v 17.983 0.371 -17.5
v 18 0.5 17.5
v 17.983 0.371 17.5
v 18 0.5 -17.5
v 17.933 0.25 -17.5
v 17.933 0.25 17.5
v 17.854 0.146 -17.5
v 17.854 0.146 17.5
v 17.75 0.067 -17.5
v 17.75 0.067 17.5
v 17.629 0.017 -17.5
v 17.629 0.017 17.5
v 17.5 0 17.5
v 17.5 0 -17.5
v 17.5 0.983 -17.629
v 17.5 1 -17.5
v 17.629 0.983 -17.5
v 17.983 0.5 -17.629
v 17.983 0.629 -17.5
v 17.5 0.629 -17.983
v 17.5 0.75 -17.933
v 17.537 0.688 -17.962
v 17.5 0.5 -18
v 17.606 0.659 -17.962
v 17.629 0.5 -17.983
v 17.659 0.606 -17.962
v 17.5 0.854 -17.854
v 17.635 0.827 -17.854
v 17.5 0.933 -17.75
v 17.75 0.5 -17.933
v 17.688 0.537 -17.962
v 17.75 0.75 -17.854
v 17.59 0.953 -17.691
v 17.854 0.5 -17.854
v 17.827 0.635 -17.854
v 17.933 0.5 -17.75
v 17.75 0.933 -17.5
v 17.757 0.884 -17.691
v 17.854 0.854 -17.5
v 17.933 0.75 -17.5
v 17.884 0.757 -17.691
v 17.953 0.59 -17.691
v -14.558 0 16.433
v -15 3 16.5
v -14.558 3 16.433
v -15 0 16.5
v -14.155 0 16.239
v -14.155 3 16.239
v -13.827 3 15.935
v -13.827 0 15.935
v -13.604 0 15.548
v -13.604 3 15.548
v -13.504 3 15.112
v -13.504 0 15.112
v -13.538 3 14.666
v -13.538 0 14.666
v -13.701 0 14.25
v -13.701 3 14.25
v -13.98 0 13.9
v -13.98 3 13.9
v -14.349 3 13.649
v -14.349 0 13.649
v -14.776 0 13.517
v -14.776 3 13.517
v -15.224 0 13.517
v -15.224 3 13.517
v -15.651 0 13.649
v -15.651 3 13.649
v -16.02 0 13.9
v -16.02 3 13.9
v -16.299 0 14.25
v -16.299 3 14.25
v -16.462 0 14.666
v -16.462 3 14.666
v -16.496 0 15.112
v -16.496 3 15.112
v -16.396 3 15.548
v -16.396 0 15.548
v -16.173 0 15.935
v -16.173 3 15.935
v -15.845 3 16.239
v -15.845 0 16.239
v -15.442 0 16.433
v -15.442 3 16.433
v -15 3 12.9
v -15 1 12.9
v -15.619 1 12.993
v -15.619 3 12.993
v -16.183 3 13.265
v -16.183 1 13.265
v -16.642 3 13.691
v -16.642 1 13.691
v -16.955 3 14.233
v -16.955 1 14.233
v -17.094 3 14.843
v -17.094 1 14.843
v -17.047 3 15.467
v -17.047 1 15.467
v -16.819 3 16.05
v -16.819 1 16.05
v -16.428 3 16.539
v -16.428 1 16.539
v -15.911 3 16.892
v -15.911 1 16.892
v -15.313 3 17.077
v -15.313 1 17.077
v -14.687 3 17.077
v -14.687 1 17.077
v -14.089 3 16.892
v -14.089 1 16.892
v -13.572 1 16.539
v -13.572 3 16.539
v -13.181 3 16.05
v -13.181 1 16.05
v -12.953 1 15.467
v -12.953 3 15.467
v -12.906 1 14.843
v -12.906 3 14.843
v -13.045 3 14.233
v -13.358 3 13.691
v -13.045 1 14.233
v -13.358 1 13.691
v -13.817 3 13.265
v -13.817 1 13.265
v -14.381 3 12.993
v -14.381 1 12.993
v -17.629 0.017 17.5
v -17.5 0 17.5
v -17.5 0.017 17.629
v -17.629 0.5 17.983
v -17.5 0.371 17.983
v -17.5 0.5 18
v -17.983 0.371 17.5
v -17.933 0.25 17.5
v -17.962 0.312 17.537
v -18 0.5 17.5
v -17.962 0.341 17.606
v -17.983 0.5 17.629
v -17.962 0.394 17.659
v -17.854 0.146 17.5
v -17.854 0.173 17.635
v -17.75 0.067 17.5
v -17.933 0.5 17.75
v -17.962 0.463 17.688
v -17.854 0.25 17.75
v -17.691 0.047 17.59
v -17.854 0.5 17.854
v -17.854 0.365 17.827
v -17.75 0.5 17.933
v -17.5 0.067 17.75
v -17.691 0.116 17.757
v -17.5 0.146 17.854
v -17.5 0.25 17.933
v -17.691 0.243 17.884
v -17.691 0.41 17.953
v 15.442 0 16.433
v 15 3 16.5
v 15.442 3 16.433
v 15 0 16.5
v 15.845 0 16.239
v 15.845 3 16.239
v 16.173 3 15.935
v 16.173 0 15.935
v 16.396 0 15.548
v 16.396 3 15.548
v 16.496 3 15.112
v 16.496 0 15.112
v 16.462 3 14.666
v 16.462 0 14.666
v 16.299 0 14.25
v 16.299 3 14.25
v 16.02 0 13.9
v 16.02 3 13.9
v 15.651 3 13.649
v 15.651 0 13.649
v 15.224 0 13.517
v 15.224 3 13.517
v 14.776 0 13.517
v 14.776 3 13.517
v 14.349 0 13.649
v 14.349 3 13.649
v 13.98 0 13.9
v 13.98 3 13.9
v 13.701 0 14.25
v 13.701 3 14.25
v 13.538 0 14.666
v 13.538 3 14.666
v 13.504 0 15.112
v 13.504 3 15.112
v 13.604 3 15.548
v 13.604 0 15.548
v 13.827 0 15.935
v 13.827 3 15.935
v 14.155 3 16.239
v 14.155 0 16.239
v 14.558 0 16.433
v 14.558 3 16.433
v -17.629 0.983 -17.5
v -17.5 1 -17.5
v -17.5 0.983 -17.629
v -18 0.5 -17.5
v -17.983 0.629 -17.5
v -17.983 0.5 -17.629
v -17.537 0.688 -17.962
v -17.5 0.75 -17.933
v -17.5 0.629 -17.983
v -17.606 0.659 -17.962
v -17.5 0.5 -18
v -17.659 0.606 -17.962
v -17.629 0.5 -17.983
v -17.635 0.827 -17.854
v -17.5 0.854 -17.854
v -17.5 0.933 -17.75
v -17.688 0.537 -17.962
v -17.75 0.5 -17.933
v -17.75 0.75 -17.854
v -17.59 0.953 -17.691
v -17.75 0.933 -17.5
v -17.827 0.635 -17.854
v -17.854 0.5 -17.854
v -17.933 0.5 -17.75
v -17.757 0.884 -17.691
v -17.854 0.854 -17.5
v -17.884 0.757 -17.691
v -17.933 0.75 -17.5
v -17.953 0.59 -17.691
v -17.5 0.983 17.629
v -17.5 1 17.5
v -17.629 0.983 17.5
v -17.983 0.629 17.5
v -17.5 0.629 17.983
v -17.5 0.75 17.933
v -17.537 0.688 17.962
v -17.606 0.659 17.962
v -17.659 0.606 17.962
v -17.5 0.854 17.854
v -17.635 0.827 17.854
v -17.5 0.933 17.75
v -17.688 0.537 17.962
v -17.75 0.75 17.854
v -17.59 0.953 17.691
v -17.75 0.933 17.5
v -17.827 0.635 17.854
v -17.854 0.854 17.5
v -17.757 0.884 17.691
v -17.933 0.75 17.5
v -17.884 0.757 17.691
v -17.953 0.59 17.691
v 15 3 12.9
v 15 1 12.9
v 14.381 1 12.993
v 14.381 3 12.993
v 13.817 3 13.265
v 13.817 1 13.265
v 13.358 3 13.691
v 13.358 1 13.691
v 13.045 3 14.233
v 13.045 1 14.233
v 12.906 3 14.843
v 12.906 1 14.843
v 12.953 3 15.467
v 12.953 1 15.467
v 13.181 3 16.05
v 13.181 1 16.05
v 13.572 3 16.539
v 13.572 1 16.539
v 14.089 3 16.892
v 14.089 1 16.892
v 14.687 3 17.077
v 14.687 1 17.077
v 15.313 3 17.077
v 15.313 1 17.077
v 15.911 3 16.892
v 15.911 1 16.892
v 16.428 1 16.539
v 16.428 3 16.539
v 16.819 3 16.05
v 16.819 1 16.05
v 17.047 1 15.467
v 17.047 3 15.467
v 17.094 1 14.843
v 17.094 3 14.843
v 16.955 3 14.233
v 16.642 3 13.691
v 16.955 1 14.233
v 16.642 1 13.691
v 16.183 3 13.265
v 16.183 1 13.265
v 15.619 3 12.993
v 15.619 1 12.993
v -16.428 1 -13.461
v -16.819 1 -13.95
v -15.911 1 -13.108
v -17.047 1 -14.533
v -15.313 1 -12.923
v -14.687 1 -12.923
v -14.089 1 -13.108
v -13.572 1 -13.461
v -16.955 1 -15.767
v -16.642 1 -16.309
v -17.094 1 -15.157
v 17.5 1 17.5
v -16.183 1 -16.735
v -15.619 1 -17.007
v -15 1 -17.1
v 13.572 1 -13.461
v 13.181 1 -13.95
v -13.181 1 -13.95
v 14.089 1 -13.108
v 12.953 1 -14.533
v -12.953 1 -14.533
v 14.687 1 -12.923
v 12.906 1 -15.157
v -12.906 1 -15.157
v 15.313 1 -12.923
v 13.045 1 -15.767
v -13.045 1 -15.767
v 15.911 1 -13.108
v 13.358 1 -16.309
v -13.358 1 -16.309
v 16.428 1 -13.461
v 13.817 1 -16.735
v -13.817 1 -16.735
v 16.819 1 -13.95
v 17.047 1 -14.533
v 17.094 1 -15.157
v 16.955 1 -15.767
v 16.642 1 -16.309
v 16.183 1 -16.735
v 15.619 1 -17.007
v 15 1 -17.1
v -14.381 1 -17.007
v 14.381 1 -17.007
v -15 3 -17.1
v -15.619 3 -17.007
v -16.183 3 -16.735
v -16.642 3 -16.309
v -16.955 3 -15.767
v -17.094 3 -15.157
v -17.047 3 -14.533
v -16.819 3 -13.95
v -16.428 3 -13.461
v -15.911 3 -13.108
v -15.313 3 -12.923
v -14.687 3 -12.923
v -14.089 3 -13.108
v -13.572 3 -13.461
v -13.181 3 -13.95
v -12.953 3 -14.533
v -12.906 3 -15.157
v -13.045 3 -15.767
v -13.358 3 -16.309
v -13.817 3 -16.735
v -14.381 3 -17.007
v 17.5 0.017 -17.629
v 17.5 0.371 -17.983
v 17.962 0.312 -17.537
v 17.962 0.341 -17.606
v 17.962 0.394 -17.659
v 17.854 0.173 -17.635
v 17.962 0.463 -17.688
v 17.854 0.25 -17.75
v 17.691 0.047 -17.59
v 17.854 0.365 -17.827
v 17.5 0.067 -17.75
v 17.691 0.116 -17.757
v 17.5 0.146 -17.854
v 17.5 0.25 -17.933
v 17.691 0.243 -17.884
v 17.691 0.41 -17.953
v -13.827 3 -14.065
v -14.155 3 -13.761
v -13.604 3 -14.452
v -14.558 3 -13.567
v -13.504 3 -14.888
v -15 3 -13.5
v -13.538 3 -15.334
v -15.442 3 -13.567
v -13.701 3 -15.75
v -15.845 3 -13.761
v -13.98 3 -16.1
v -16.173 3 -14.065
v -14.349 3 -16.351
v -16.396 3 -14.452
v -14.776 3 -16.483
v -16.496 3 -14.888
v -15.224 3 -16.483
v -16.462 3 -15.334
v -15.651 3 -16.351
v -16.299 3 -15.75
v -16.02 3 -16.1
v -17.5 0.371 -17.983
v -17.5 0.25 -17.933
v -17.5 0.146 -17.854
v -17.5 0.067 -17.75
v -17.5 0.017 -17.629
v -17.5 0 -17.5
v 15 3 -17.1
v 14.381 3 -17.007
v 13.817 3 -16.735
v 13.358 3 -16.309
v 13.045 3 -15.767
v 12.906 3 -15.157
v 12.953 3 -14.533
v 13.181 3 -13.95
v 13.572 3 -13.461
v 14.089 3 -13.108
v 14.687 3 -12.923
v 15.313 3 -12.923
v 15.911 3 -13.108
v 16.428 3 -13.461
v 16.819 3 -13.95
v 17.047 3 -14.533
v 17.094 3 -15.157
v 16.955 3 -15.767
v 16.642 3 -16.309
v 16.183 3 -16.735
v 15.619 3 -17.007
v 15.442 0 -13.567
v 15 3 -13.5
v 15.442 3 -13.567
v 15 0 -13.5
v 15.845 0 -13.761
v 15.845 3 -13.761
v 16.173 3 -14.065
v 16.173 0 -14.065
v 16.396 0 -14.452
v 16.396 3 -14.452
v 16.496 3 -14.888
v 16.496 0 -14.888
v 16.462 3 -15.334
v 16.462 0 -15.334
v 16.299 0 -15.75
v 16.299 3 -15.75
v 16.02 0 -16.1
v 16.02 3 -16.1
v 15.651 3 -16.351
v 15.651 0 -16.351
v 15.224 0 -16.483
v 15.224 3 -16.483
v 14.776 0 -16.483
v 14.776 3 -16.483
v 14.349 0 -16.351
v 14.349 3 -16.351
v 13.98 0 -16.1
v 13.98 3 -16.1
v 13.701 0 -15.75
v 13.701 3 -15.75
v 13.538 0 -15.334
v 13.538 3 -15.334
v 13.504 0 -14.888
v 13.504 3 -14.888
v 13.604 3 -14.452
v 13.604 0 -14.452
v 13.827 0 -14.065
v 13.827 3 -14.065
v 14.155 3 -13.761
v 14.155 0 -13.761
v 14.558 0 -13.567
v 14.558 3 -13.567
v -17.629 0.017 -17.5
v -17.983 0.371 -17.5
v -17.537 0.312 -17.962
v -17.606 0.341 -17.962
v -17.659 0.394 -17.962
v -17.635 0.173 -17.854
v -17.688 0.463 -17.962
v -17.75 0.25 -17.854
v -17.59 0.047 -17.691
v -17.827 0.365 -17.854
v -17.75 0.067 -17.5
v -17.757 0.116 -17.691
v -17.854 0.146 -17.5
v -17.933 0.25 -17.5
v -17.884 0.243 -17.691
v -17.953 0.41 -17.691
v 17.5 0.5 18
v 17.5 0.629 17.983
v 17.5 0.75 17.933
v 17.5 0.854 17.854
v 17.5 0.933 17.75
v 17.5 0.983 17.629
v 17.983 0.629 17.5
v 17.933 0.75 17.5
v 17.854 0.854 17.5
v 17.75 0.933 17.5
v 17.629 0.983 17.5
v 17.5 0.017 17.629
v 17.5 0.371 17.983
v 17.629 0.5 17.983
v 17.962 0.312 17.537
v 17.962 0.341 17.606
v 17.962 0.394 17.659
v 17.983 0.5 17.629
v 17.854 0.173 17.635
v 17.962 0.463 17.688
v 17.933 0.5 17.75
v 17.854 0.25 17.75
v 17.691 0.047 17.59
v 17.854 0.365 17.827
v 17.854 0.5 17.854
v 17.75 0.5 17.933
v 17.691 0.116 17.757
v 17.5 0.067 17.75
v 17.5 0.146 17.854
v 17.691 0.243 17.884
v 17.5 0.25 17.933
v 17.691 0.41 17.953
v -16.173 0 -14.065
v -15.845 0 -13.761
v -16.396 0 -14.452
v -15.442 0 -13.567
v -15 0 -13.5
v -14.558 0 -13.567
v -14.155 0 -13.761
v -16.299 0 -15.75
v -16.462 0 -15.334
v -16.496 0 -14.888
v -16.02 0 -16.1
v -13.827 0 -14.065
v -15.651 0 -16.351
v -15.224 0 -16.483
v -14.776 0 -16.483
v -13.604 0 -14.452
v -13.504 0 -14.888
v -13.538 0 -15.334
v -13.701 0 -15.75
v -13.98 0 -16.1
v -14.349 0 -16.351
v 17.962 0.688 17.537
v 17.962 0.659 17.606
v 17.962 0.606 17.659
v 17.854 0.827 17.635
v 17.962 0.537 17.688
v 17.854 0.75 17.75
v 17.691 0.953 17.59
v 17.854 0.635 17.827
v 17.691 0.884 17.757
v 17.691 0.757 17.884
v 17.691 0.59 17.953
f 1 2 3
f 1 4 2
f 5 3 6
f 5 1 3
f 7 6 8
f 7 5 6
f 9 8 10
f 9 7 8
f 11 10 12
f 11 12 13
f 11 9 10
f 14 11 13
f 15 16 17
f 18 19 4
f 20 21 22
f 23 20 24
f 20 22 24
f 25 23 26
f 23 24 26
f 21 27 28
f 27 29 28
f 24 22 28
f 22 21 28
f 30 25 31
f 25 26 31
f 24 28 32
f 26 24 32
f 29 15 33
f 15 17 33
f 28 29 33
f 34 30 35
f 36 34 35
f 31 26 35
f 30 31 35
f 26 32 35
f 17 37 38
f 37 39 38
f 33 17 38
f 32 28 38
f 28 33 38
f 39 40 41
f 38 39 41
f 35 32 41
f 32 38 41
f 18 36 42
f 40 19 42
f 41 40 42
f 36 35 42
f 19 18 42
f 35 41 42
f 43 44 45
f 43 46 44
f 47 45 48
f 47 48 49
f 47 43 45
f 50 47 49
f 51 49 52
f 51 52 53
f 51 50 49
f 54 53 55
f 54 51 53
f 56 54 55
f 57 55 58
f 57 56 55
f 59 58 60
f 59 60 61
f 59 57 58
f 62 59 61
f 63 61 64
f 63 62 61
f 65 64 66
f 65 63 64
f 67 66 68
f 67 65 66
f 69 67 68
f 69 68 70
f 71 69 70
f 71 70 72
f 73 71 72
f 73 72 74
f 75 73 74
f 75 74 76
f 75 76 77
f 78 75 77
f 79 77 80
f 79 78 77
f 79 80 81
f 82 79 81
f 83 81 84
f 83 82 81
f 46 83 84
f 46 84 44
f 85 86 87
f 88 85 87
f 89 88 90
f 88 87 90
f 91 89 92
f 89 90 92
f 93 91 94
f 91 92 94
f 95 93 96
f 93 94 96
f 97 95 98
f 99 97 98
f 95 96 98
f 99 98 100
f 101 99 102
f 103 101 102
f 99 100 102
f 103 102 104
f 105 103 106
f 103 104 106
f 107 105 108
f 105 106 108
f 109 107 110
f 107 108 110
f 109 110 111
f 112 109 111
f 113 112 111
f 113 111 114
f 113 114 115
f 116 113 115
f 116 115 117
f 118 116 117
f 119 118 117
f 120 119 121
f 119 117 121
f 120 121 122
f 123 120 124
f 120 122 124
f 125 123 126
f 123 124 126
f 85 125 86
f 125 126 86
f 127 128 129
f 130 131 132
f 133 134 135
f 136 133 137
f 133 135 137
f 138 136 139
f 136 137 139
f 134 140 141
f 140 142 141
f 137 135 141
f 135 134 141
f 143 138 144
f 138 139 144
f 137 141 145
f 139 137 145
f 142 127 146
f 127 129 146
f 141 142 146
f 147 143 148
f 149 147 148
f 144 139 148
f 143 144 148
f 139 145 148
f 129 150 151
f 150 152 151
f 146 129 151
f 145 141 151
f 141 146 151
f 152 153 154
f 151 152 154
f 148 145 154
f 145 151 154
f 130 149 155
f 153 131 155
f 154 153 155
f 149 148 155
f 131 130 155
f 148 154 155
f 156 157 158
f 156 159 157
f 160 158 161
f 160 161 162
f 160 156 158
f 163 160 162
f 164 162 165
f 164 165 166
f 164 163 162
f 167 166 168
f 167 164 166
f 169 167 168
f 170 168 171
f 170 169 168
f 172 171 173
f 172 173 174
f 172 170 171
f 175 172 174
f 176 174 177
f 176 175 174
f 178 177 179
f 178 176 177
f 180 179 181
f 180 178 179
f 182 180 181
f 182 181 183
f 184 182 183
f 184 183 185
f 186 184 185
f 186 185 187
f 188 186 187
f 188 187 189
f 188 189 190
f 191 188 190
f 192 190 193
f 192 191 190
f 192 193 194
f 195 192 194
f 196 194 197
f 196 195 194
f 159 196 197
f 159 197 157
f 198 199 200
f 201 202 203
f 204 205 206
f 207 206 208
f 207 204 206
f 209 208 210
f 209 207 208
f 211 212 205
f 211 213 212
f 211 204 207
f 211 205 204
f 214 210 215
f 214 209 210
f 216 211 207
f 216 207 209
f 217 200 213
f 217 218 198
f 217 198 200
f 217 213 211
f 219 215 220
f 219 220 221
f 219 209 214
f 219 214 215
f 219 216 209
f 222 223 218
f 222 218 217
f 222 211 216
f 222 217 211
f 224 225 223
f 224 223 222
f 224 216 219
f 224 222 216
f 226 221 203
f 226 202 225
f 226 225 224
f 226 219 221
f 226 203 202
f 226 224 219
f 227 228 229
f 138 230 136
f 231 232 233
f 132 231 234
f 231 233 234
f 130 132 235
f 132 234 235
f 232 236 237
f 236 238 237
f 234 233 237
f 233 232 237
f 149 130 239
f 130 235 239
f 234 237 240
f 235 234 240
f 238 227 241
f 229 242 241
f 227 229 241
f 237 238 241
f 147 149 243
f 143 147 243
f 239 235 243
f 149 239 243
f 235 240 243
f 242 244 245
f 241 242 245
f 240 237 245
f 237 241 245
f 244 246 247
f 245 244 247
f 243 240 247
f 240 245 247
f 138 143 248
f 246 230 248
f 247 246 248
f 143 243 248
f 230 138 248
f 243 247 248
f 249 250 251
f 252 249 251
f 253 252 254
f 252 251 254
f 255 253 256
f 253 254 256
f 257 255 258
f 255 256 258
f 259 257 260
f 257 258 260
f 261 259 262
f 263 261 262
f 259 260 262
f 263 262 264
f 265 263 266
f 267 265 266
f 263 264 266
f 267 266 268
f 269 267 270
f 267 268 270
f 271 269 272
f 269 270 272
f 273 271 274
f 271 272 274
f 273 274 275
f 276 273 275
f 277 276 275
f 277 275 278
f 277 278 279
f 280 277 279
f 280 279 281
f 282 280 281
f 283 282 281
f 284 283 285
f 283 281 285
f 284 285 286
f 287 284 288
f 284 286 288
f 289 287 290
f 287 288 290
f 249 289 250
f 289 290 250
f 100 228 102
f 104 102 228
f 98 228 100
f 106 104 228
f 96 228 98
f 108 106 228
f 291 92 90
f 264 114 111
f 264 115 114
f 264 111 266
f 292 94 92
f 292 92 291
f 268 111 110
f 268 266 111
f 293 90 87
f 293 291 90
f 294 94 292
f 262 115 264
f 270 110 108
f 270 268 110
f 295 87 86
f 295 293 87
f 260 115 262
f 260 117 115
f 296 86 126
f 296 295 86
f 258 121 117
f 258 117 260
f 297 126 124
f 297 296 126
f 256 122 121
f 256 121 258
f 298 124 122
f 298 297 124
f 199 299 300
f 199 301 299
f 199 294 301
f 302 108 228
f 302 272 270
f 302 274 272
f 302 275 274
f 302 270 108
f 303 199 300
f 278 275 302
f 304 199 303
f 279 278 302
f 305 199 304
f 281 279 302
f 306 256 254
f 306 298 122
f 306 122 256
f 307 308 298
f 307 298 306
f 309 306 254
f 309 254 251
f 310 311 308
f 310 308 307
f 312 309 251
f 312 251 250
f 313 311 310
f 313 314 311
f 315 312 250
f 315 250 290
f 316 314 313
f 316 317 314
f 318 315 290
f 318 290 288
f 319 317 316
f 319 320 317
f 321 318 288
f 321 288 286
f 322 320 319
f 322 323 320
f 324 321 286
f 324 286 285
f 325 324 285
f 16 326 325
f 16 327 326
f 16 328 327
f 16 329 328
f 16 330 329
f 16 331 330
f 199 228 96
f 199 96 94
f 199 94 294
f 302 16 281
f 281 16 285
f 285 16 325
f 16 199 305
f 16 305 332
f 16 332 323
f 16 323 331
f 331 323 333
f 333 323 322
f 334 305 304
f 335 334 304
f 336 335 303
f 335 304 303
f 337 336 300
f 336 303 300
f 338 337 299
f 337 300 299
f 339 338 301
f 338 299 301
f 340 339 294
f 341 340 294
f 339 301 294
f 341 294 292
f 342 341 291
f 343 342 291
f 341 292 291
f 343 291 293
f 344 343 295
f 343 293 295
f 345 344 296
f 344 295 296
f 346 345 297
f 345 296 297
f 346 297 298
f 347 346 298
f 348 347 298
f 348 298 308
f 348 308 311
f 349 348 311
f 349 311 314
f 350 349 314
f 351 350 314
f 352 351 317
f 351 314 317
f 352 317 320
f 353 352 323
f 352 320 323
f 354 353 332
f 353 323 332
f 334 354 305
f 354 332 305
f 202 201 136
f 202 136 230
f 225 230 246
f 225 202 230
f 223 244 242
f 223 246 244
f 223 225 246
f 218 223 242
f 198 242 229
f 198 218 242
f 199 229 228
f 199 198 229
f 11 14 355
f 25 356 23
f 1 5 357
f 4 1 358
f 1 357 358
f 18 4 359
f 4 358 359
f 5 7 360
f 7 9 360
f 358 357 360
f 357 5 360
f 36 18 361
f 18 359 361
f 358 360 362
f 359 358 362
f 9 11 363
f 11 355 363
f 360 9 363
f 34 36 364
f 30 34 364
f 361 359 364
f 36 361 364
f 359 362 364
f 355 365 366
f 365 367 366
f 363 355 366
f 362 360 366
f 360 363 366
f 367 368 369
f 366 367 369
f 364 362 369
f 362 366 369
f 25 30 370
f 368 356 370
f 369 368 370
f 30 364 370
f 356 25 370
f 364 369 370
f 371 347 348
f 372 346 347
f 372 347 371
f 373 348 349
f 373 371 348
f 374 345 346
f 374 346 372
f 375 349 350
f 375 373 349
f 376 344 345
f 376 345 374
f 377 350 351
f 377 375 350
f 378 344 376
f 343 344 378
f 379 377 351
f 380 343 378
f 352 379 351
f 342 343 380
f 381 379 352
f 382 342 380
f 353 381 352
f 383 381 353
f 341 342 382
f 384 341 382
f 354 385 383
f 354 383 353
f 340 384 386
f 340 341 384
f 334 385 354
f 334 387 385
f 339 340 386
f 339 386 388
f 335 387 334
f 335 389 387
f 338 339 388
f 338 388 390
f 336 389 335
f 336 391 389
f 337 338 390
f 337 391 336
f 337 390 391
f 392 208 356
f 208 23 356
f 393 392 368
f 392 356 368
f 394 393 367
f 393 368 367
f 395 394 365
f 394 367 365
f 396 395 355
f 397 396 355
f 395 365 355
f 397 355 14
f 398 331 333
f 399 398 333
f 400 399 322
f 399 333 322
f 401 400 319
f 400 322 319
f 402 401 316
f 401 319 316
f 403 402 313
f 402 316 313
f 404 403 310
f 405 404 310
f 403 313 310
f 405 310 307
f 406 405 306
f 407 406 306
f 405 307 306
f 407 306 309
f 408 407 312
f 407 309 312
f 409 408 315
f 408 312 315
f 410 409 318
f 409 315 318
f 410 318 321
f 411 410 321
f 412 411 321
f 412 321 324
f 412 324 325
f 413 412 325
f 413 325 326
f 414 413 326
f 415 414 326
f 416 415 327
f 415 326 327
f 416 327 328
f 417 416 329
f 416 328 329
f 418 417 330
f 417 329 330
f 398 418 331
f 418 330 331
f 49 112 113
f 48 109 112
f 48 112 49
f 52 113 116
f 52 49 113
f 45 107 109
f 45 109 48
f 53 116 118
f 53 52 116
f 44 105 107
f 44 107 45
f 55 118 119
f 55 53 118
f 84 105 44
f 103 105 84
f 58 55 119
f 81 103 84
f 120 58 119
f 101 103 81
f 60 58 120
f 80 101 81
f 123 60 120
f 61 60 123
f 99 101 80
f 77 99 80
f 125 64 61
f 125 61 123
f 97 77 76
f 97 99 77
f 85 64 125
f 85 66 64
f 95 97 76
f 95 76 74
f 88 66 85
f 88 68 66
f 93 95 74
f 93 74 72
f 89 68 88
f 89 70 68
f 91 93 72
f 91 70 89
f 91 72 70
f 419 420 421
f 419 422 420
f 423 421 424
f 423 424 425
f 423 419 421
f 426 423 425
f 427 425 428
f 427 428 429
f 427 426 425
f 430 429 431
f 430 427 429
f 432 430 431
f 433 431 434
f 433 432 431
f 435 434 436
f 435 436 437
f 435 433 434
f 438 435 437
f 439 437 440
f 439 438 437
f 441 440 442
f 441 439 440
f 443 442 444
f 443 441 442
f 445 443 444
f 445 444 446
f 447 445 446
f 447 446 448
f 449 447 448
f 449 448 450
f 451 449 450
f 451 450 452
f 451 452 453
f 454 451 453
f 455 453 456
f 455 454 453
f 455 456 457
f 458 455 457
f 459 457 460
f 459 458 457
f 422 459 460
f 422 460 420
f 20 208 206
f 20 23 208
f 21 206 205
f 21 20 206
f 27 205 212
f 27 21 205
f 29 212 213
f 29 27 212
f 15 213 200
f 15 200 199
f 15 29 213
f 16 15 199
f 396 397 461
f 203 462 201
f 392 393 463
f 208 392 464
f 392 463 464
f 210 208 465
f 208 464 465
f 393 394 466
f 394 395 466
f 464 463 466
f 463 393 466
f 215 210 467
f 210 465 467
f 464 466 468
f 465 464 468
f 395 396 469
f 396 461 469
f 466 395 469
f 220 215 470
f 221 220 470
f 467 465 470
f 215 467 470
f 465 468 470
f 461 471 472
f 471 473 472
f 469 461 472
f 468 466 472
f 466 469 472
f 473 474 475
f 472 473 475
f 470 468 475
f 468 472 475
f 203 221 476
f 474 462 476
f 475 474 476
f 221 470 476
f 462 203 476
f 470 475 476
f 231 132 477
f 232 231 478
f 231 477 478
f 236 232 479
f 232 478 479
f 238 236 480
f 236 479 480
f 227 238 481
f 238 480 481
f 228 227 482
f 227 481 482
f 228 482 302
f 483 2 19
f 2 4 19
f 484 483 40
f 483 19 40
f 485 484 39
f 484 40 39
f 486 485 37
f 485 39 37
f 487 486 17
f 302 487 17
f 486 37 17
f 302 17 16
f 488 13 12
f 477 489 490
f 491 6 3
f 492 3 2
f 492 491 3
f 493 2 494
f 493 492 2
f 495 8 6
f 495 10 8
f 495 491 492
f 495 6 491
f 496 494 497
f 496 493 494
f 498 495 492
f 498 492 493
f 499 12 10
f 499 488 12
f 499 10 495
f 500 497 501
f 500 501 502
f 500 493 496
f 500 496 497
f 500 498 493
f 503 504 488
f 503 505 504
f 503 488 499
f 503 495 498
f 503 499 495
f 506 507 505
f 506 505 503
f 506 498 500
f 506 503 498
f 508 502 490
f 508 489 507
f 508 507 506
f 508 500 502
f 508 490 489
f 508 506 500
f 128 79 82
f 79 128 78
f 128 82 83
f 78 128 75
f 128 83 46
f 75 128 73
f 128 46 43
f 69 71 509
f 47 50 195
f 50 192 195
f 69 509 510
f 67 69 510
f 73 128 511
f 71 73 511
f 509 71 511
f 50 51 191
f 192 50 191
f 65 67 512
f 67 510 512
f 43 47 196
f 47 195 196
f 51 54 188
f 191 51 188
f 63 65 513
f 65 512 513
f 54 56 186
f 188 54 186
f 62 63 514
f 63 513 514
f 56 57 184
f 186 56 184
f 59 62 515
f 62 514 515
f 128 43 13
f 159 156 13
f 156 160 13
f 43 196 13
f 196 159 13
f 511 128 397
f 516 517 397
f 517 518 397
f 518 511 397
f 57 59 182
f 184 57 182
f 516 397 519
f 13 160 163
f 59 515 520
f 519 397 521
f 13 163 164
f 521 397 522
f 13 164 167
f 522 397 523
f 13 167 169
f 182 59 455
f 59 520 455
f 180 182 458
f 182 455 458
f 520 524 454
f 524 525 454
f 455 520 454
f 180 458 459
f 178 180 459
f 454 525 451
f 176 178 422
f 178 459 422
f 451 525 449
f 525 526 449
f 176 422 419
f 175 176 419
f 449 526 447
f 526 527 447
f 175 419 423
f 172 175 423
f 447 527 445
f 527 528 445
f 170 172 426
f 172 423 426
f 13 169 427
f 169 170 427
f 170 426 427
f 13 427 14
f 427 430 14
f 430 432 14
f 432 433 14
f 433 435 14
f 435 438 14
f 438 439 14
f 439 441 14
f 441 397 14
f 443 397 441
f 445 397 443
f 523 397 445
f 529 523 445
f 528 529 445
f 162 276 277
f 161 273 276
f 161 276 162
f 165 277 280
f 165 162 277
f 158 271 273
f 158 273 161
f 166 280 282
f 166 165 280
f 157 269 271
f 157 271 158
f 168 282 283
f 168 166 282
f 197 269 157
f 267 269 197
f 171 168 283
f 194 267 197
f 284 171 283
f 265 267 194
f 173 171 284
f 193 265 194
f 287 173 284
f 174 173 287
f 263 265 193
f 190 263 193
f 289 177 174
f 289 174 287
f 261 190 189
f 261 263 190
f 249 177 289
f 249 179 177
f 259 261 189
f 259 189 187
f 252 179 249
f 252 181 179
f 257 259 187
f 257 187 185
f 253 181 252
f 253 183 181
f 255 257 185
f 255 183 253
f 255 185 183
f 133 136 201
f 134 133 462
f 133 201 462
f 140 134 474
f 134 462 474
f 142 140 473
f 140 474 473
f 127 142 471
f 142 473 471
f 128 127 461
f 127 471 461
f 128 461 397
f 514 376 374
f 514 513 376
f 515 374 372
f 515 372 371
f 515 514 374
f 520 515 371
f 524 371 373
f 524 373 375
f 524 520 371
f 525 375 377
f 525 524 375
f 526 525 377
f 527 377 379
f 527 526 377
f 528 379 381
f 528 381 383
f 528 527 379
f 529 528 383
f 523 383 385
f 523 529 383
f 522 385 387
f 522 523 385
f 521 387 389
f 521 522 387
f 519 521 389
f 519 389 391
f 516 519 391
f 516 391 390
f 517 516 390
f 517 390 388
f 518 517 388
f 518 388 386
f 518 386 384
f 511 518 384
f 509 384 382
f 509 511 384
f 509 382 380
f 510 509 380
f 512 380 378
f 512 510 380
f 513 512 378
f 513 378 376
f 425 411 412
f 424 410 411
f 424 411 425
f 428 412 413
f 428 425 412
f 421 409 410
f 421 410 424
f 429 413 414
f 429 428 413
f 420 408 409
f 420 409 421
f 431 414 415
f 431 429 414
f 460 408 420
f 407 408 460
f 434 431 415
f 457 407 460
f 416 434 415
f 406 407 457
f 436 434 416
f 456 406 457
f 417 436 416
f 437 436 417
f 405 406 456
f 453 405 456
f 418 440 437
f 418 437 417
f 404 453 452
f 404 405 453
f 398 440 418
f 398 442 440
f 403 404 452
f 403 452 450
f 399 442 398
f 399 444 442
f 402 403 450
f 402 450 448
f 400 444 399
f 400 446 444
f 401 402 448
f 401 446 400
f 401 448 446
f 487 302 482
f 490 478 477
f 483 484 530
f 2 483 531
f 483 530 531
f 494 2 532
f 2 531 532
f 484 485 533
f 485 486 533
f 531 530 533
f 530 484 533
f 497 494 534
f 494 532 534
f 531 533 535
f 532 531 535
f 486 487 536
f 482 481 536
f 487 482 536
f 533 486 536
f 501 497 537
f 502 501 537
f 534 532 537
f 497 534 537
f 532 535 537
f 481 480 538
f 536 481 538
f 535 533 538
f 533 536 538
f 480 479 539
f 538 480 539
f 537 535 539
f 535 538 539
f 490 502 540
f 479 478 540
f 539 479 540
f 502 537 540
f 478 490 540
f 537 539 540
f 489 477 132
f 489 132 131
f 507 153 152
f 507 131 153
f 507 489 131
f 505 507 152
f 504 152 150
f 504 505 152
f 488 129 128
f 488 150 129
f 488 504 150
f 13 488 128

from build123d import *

# Parameters (mm, degrees)
SKETCH2_W               = 36
SKETCH2_H               = 36
SKETCH2_R               = 1.5
BOSS_EXTRUDE2_DEPTH     = 1
FILLET1_R               = 0.5
CROQUIS1_R              = 2.1
CROQUIS1_R_2            = 1.5
SALIENTE_EXTRUIR1_DEPTH = 2


with BuildPart() as part:
    # Sketch2 → Boss-Extrude2 (new body)
    with BuildSketch(Plane(origin=(0, 0, 0), x_dir=(1, 0, 0), z_dir=(0, 1, 0))):
        Rectangle(SKETCH2_W, SKETCH2_H)
        with Locations(Location((-15, 15, 0), (0, 0, 270))):
            Circle(SKETCH2_R, mode=Mode.SUBTRACT)
        with Locations(Location((-15, -15, 0), (0, 0, 270))):
            Circle(SKETCH2_R, mode=Mode.SUBTRACT)
        with Locations(Location((15, -15, 0), (0, 0, 270))):
            Circle(SKETCH2_R, mode=Mode.SUBTRACT)
        with Locations(Location((15, 15, 0), (0, 0, 270))):
            Circle(SKETCH2_R, mode=Mode.SUBTRACT)
    extrude(amount=BOSS_EXTRUDE2_DEPTH)

    # Fillet1
    fillet1_edges = [part.edges().sort_by_distance(p)[0] for p in [
        (-18, 1, 0),
        (0, 1, 18),
        (18, 1, 0),
        (0, 0, 18),
        (-18, 0, 0),
        (0, 0, -18),
        (18, 0, 0),
        (0, 1, -18),
        (18, 0.5, 18),
        (-18, 0.5, 18),
        (-18, 0.5, -18),
        (18, 0.5, -18),
    ]]
    fillet(fillet1_edges, radius=FILLET1_R - 0.0001)  # a hair under: the kernel refuses the full size

    # Croquis1 → Saliente-Extruir1 (add)
    # profile 1 of 4: a face of its own
    with BuildSketch(Plane(origin=(0, 1, 0), x_dir=(1, 0, 0), z_dir=(0, 1, 0))):
        with Locations(Location((-15, -15, 0), (0, 0, 90))):
            Circle(CROQUIS1_R)
        with Locations(Location((-15, -15, 0), (0, 0, 270))):
            Circle(CROQUIS1_R_2, mode=Mode.SUBTRACT)
    # profile 2 of 4: a face of its own
    with BuildSketch(Plane(origin=(0, 1, 0), x_dir=(1, 0, 0), z_dir=(0, 1, 0))):
        with Locations(Location((-15, 15, 0), (0, 0, 90))):
            Circle(CROQUIS1_R)
        with Locations(Location((-15, 15, 0), (0, 0, 270))):
            Circle(CROQUIS1_R_2, mode=Mode.SUBTRACT)
    # profile 3 of 4: a face of its own
    with BuildSketch(Plane(origin=(0, 1, 0), x_dir=(1, 0, 0), z_dir=(0, 1, 0))):
        with Locations(Location((15, 15, 0), (0, 0, 90))):
            Circle(CROQUIS1_R)
        with Locations(Location((15, 15, 0), (0, 0, 270))):
            Circle(CROQUIS1_R_2, mode=Mode.SUBTRACT)
    # profile 4 of 4: a face of its own
    with BuildSketch(Plane(origin=(0, 1, 0), x_dir=(1, 0, 0), z_dir=(0, 1, 0))):
        with Locations(Location((15, -15, 0), (0, 0, 90))):
            Circle(CROQUIS1_R)
        with Locations(Location((15, -15, 0), (0, 0, 270))):
            Circle(CROQUIS1_R_2, mode=Mode.SUBTRACT)
    extrude(amount=SALIENTE_EXTRUIR1_DEPTH)


solid = part.part
